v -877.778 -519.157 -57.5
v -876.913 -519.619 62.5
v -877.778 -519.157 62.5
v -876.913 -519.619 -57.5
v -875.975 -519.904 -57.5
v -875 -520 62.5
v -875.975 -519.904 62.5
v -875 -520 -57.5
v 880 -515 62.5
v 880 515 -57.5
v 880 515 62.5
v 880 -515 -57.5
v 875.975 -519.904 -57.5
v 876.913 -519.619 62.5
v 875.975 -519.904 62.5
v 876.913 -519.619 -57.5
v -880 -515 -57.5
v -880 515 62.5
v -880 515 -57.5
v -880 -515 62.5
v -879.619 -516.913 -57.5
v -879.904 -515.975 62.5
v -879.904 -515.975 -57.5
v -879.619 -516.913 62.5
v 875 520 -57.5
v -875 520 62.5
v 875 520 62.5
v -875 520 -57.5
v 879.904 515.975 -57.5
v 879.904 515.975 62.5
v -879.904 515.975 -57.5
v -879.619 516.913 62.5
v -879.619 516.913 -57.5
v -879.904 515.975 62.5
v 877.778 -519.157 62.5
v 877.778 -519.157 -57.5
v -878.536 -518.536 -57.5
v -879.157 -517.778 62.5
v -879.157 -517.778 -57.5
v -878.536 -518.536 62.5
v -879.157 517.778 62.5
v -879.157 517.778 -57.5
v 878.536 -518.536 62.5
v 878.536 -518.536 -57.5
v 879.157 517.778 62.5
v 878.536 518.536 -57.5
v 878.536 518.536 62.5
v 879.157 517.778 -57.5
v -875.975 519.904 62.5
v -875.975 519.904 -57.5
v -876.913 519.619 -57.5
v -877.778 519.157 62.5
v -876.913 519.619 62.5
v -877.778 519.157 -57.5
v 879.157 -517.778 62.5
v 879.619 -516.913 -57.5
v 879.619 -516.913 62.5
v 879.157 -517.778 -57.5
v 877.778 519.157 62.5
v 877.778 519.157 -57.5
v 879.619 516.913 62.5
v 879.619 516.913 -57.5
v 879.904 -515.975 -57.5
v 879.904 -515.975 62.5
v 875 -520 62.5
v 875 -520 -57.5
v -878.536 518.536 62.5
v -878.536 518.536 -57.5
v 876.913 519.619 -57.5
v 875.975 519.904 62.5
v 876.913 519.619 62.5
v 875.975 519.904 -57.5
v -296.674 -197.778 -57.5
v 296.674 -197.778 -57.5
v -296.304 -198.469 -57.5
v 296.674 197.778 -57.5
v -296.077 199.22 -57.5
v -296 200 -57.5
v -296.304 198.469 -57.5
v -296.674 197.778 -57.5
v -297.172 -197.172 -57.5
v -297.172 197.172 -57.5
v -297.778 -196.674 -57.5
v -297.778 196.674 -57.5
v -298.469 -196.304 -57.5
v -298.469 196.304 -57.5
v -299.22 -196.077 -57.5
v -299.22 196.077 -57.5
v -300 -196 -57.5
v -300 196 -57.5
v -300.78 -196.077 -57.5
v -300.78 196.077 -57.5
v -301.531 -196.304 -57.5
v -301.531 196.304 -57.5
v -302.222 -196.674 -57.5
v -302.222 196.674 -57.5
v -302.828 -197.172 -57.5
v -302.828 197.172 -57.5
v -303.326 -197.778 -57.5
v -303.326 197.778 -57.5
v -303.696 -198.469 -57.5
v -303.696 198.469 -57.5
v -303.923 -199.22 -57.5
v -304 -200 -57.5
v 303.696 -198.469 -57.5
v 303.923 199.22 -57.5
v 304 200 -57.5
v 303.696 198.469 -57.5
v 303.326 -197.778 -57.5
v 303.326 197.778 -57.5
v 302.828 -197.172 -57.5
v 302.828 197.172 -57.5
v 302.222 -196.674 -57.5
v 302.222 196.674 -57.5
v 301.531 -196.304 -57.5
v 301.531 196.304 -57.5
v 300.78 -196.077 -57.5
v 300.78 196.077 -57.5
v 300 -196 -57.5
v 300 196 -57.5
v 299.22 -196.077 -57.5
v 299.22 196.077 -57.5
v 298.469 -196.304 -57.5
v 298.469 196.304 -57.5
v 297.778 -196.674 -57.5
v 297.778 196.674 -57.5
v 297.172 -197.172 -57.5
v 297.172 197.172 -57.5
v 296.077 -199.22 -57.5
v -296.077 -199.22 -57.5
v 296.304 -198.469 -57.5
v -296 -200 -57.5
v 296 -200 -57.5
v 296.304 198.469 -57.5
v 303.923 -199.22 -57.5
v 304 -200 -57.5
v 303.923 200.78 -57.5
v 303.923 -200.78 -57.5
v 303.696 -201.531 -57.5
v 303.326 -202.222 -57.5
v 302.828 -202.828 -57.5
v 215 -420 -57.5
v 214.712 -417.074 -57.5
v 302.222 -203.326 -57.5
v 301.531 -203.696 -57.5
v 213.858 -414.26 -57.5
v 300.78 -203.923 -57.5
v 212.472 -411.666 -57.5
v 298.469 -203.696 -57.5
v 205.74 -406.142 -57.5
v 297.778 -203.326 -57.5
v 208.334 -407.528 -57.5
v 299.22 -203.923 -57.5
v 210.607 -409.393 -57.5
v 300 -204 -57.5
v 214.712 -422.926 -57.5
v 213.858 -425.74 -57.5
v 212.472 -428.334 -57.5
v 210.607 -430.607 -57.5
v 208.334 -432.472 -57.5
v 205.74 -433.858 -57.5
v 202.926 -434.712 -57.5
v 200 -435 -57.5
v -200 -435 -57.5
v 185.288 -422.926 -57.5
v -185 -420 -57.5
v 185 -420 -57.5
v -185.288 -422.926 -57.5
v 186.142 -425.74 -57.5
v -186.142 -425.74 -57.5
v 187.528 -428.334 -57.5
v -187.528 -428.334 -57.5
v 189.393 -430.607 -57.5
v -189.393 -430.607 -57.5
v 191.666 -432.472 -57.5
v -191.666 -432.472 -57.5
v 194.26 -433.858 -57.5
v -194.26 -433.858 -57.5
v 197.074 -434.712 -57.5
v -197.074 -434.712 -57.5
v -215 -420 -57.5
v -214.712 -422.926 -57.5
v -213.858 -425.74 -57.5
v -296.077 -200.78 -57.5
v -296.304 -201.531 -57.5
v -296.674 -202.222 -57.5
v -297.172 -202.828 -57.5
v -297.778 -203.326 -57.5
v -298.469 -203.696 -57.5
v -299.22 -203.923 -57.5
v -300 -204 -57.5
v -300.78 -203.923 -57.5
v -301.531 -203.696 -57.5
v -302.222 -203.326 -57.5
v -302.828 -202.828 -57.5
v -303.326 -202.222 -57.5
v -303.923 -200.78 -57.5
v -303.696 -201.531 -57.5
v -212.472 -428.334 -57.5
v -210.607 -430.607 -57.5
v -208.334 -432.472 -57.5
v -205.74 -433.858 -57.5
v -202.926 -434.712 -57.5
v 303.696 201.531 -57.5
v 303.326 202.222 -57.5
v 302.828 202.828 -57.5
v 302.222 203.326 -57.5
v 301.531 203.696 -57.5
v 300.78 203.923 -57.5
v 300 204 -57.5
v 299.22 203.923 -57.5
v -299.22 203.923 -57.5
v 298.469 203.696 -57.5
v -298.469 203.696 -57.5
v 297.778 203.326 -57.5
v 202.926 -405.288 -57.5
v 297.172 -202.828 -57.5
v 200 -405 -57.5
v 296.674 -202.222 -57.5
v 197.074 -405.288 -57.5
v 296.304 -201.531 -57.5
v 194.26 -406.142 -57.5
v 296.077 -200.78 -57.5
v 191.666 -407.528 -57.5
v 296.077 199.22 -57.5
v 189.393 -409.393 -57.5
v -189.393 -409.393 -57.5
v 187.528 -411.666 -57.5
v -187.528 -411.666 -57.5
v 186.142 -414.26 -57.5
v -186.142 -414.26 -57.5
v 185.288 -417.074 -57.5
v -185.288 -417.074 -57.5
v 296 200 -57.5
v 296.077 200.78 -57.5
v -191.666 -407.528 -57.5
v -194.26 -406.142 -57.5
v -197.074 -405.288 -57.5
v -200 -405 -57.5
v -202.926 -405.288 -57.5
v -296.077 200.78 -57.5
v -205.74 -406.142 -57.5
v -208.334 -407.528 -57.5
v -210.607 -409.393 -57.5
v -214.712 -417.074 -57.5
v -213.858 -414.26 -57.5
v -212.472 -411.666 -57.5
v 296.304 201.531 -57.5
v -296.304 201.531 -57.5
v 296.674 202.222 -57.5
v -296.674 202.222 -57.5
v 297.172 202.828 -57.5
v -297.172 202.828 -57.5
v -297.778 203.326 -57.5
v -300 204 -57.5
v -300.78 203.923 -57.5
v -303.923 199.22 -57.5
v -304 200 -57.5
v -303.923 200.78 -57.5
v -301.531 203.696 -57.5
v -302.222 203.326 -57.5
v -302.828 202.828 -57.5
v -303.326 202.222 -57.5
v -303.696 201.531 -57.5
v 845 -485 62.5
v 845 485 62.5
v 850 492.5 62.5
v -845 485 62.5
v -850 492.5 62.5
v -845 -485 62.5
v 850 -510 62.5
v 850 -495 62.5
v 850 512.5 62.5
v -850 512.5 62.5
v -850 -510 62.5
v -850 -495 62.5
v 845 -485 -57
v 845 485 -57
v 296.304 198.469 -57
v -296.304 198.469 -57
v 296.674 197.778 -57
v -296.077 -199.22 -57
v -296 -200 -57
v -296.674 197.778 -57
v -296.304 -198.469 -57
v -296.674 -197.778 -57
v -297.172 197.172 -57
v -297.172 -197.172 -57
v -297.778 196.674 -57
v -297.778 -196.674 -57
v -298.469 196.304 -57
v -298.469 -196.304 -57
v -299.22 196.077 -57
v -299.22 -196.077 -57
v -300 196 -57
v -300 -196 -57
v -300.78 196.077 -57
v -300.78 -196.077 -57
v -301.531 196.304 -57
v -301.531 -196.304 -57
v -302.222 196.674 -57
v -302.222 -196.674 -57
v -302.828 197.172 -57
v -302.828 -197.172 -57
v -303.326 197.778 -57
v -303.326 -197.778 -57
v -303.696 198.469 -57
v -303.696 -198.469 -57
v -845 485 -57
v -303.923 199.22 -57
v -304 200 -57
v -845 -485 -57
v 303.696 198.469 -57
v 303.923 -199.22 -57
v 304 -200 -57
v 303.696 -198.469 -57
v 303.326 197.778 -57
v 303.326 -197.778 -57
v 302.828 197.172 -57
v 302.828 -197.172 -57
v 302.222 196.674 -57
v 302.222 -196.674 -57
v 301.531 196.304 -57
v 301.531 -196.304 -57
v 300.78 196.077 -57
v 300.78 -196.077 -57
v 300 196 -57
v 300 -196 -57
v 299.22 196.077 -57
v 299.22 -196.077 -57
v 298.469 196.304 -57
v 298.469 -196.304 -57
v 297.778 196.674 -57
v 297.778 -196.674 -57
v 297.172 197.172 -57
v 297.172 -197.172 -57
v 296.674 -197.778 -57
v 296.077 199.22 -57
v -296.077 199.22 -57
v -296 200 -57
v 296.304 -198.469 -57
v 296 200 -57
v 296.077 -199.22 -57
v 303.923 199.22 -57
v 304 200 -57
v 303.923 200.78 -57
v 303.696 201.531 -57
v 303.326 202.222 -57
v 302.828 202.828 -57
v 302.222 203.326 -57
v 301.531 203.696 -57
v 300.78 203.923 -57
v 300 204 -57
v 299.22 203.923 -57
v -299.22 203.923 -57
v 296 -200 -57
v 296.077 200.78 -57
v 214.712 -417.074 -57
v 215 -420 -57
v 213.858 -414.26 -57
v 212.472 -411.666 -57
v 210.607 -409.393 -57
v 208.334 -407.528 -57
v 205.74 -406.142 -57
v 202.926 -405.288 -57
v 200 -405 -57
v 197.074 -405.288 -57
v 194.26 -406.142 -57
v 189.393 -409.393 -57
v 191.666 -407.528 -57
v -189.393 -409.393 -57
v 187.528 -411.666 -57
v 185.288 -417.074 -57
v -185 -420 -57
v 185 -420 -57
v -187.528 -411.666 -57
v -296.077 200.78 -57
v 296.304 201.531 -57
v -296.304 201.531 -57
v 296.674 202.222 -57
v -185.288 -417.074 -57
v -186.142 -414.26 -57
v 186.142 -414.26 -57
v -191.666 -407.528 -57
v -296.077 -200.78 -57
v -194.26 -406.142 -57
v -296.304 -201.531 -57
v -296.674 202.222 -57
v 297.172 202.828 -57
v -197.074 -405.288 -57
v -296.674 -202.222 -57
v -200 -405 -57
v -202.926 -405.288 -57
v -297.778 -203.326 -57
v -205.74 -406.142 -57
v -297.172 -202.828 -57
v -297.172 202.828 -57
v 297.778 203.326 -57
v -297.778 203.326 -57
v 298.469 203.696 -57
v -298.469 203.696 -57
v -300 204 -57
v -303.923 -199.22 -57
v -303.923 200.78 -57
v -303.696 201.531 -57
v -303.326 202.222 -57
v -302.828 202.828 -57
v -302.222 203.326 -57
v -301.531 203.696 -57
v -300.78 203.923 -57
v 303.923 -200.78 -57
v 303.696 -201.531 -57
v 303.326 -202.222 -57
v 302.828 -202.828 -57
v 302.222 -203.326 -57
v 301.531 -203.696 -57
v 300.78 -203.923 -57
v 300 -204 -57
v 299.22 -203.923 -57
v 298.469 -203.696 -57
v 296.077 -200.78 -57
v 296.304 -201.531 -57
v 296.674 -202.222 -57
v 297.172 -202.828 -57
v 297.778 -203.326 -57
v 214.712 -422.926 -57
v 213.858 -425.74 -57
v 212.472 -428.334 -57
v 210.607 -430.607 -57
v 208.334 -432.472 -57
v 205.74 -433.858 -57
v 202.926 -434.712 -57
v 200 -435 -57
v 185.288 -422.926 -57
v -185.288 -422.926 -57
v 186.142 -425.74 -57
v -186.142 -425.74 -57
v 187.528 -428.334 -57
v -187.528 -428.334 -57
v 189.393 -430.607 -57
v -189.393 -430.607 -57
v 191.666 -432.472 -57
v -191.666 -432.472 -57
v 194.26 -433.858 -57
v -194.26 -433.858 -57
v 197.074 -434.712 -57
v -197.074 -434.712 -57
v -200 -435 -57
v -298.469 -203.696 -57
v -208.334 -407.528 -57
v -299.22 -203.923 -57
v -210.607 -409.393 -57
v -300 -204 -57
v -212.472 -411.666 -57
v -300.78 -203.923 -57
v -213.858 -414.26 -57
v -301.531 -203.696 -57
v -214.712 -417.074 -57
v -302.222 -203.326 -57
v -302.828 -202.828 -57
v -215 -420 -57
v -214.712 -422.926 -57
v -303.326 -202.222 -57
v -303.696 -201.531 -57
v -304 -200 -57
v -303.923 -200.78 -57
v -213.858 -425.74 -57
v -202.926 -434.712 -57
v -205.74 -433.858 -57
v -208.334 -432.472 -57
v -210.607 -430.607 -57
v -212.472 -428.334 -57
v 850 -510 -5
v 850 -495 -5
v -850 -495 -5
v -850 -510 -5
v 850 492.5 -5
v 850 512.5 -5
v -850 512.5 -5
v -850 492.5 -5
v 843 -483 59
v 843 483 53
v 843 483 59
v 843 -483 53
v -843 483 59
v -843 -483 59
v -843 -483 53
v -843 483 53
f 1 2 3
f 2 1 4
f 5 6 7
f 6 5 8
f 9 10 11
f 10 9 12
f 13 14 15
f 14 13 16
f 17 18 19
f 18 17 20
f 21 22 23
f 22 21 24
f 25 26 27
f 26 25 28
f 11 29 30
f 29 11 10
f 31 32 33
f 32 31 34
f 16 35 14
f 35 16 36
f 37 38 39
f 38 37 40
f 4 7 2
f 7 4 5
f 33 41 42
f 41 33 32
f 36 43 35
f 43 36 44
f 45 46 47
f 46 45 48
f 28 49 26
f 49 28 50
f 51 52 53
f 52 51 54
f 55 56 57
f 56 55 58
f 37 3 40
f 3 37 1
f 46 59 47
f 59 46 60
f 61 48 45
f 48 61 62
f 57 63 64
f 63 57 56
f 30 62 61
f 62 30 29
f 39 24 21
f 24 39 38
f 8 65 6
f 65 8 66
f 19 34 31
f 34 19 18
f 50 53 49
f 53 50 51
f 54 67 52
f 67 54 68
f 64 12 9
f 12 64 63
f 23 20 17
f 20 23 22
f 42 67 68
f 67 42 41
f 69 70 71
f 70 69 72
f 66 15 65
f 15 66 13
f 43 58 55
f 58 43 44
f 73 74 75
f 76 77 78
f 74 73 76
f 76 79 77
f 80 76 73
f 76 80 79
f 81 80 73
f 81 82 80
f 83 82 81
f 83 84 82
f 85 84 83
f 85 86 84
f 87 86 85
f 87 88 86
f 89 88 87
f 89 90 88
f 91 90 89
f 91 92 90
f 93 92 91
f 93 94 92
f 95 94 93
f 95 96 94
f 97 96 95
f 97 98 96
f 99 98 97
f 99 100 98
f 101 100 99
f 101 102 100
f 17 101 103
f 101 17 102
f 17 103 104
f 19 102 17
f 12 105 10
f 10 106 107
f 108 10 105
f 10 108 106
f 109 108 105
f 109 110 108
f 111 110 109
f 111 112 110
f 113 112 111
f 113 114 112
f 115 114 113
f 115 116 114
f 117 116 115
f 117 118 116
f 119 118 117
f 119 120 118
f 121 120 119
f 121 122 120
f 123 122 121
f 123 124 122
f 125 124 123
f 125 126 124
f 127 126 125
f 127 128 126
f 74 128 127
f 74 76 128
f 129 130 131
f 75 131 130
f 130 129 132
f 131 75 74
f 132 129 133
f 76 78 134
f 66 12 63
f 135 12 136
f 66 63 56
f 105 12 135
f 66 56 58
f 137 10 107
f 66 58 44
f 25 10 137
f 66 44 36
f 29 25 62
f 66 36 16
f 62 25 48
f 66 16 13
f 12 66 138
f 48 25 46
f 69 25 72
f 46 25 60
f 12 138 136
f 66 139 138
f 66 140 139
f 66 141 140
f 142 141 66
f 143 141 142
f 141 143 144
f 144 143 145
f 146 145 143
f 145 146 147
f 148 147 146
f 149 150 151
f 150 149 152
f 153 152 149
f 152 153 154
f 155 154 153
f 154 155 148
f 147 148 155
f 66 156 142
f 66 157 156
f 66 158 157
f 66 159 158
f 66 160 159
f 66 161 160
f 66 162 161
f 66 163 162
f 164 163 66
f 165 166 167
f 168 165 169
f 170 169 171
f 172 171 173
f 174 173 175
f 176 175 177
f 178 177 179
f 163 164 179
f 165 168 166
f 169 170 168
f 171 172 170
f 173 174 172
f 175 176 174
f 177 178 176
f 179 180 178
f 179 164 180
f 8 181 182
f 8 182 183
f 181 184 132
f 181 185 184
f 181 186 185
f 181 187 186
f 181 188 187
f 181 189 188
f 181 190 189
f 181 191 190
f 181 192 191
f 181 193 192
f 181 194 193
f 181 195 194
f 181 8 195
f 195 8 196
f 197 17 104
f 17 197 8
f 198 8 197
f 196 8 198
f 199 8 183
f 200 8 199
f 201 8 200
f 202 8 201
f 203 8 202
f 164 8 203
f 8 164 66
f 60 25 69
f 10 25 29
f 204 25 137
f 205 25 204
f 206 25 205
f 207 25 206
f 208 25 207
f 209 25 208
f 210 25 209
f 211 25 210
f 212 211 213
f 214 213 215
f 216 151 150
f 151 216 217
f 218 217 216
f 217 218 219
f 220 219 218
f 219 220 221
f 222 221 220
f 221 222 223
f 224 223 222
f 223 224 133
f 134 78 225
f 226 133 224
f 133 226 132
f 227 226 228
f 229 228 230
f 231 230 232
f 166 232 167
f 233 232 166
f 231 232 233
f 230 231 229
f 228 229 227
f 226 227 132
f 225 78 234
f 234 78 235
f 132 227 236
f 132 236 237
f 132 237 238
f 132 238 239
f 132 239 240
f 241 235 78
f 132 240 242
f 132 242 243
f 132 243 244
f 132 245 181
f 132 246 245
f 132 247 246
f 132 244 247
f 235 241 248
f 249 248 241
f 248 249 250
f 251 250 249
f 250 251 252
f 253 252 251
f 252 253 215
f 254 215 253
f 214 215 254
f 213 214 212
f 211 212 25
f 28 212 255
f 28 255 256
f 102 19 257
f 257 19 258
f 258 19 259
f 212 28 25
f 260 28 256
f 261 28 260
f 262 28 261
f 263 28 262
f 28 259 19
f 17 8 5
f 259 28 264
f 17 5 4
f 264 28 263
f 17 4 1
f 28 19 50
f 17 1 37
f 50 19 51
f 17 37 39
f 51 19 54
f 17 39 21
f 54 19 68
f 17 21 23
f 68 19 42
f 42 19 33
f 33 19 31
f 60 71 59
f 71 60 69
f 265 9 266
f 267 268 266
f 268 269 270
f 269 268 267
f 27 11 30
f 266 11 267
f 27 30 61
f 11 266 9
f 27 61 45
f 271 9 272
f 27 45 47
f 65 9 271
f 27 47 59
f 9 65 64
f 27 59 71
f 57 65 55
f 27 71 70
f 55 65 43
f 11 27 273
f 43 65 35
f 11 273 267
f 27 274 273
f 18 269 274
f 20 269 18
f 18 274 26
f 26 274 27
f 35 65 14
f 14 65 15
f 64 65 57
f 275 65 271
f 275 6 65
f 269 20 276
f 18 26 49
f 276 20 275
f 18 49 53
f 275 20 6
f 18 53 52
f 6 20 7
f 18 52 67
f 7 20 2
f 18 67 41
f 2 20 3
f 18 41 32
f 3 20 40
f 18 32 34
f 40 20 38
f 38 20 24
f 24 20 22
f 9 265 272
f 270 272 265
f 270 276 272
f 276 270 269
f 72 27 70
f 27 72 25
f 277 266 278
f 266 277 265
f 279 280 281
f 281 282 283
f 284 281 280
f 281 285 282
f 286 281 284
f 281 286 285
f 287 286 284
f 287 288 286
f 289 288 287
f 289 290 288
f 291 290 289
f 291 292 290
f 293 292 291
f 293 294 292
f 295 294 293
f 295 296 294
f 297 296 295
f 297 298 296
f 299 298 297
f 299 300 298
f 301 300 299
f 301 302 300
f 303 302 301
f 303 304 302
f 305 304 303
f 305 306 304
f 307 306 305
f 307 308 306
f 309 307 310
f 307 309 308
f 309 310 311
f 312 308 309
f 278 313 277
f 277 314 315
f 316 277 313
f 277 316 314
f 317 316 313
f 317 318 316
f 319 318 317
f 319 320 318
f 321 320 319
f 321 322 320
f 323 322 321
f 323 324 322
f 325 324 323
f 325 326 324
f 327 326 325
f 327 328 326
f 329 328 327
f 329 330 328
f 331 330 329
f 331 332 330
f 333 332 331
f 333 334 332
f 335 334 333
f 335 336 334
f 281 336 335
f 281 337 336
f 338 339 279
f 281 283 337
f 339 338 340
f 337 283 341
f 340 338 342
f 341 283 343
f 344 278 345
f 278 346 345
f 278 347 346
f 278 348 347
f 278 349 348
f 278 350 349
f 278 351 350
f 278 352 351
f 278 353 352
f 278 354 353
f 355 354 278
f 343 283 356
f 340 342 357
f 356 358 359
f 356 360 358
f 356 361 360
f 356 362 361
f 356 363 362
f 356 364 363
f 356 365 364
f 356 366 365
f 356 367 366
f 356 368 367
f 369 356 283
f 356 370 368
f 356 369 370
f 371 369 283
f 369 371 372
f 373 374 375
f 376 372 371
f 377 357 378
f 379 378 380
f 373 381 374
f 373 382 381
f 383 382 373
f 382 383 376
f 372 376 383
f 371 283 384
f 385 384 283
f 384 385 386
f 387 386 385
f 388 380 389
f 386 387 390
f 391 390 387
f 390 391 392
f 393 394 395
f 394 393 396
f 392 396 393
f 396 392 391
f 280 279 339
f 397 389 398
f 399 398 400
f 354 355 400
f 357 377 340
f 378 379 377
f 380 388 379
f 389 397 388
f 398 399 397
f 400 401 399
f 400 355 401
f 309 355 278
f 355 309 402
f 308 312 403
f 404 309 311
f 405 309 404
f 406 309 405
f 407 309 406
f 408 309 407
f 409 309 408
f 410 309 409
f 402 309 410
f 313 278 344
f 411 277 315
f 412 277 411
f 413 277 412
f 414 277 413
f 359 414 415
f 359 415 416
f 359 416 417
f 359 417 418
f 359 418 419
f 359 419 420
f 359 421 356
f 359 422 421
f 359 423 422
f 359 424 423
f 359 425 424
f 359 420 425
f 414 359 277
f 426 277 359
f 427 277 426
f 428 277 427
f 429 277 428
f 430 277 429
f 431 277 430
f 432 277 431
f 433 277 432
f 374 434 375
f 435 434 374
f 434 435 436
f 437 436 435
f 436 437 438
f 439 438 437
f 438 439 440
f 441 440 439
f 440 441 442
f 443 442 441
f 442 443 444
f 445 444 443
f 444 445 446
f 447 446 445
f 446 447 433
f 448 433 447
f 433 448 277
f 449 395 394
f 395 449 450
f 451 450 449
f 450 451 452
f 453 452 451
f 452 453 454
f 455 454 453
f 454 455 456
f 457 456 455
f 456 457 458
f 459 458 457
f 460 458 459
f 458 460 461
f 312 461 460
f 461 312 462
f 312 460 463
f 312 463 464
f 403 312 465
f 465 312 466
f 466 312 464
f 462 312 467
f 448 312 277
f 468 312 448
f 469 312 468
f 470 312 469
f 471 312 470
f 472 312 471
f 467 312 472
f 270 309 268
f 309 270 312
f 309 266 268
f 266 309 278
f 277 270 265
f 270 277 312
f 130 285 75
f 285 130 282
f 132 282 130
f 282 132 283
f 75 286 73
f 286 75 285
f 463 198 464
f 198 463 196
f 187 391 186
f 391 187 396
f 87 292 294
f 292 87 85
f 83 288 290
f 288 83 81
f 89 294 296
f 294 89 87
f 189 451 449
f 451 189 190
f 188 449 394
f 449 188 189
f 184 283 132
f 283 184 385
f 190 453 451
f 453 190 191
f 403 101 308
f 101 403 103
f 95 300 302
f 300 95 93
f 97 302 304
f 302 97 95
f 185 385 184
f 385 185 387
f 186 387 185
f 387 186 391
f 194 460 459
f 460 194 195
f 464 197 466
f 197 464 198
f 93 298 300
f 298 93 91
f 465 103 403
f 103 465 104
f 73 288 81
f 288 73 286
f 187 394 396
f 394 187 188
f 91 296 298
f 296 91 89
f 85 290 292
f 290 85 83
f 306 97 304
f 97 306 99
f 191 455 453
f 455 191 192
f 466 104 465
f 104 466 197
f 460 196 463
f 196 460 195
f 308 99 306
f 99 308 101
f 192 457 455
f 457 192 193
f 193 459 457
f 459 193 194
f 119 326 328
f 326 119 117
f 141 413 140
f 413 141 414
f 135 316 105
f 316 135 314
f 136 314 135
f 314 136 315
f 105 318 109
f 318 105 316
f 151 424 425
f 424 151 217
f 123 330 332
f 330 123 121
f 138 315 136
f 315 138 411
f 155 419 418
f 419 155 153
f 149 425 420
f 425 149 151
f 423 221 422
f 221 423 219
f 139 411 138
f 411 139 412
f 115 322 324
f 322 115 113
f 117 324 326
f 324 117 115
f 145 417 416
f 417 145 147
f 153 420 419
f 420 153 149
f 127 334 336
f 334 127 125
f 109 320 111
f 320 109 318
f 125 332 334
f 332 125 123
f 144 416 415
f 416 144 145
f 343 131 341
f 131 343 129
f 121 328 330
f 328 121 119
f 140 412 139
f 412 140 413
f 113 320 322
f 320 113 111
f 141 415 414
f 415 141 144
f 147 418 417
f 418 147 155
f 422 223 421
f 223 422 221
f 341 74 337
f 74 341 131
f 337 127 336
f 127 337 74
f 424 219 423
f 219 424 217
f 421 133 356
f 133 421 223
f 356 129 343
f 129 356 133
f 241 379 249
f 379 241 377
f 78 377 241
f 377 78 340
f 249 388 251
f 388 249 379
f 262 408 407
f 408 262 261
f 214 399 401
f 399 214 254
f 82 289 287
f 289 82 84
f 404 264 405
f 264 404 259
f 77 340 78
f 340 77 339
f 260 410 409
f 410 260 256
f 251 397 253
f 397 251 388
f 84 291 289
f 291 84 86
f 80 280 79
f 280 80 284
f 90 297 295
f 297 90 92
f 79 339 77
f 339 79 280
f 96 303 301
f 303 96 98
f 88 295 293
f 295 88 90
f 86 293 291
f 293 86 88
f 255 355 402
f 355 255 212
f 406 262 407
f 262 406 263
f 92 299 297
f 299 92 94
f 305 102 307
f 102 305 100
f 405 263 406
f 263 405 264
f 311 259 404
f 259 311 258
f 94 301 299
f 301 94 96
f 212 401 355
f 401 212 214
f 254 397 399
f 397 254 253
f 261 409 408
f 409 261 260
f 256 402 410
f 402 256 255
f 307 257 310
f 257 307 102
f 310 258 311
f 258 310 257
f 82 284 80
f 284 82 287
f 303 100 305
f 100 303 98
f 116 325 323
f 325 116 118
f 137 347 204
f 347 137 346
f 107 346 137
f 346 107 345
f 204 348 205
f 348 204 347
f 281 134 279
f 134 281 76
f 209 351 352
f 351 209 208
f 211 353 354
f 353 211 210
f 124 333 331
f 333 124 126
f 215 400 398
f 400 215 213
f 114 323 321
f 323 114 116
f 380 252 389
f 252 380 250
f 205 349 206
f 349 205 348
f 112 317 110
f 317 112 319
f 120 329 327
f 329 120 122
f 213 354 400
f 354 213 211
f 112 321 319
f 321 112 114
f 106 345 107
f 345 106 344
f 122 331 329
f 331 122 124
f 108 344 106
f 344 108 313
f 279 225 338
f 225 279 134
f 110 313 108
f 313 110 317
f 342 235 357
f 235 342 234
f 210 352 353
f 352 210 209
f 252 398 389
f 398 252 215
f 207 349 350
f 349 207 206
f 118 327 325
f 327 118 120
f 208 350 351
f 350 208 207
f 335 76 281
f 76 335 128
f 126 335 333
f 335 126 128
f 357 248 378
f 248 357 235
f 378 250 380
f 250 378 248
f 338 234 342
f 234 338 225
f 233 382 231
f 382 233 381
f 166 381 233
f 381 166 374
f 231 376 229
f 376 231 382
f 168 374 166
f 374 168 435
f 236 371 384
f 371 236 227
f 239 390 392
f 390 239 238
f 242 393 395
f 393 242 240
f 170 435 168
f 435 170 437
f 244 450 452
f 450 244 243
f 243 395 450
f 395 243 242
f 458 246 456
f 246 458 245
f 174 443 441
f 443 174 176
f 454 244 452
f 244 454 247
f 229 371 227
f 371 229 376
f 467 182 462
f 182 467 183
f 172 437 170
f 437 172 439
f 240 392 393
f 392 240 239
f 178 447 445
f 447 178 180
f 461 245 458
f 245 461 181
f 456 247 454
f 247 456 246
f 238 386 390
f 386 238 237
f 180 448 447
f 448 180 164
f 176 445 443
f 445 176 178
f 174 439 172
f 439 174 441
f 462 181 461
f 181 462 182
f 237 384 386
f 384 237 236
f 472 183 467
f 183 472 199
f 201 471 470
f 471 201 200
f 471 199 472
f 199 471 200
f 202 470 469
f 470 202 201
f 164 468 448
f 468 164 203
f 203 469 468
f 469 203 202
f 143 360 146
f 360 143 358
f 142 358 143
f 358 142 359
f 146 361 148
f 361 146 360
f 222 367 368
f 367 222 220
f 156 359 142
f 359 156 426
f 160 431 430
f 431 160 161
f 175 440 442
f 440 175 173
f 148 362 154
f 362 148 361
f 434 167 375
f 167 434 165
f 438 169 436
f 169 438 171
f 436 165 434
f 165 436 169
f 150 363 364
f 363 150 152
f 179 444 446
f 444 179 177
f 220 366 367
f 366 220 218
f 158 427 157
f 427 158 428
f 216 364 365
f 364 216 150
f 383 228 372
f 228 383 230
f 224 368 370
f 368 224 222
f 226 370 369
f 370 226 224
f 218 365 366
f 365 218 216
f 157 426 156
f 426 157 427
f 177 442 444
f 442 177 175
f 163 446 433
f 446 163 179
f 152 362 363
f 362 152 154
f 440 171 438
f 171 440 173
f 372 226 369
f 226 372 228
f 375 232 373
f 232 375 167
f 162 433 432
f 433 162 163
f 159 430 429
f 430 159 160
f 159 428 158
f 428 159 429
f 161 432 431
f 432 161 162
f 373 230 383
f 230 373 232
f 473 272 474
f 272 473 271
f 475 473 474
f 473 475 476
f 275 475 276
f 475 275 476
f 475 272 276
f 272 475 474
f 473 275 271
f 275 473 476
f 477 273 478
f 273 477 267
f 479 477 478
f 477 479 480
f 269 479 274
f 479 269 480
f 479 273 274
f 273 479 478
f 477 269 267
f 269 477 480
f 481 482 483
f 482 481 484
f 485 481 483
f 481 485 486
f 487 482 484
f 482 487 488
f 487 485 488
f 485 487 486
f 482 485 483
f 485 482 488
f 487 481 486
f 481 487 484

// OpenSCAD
// ATE-75 Outdoor TV Enclosure - OpenSCAD Model
// Apex Enclosures v3.0 Front-Breathing Design
// All dimensions in mm

// ============================================
// PARAMETERS
// ============================================

// Overall dimensions
WIDTH = 1760;       // External width
HEIGHT = 1040;      // External height
DEPTH = 120;        // External depth

// Frame construction
BEZEL_WIDTH = 35;   // Bezel width
WALL_THICK = 3;     // Aluminum wall thickness

// Air channel
AIR_GAP = 25;       // Gap between glass and TV

// Airflow slots
INTAKE_SLOT_WIDTH = 1700;   // Bottom intake slot length
INTAKE_SLOT_HEIGHT = 15;    // Bottom intake slot height
EXHAUST_SLOT_WIDTH = 1700;  // Top exhaust slot length
EXHAUST_SLOT_HEIGHT = 20;   // Top exhaust slot height

// Fan specifications
FAN_COUNT = 4;
FAN_DIAMETER = 60;
FAN_DEPTH = 15;

// VESA mount (600x400 for 75" TV)
VESA_H = 600;
VESA_V = 400;
VESA_HOLE = 8;      // M8 holes

// Glass
GLASS_THICK = 6;

// Corner radius for aesthetics
CORNER_R = 5;

// ============================================
// MAIN ENCLOSURE
// ============================================

module outer_shell() {
    difference() {
        // Outer body with rounded corners
        minkowski() {
            cube([WIDTH - CORNER_R*2, HEIGHT - CORNER_R*2, DEPTH - CORNER_R], center=true);
            cylinder(r=CORNER_R, h=CORNER_R, $fn=32);
        }

        // Inner cavity (hollow out)
        translate([0, 0, WALL_THICK])
        cube([WIDTH - BEZEL_WIDTH*2, HEIGHT - BEZEL_WIDTH*2, DEPTH], center=true);
    }
}

// ============================================
// BOTTOM BEZEL - INTAKE SLOT
// ============================================

module intake_slot() {
    translate([0, -HEIGHT/2 + BEZEL_WIDTH/2, DEPTH/2])
    cube([INTAKE_SLOT_WIDTH, INTAKE_SLOT_HEIGHT, DEPTH + 10], center=true);
}

// ============================================
// TOP BEZEL - EXHAUST SLOT
// ============================================

module exhaust_slot() {
    translate([0, HEIGHT/2 - BEZEL_WIDTH/2, DEPTH/2])
    cube([EXHAUST_SLOT_WIDTH, EXHAUST_SLOT_HEIGHT, DEPTH + 10], center=true);
}

// ============================================
// FAN HOLES (4x 60mm in top bezel)
// ============================================

module fan_holes() {
    fan_spacing = EXHAUST_SLOT_WIDTH / (FAN_COUNT + 1);

    for (i = [1:FAN_COUNT]) {
        translate([-EXHAUST_SLOT_WIDTH/2 + fan_spacing * i,
                   HEIGHT/2 - BEZEL_WIDTH/2,
                   DEPTH - FAN_DEPTH/2])
        cylinder(d=FAN_DIAMETER, h=FAN_DEPTH + 10, center=true, $fn=64);
    }
}

// ============================================
// VESA MOUNT PATTERN
// ============================================

module vesa_holes() {
    positions = [
        [-VESA_H/2, -VESA_V/2],
        [VESA_H/2, -VESA_V/2],
        [-VESA_H/2, VESA_V/2],
        [VESA_H/2, VESA_V/2]
    ];

    for (pos = positions) {
        translate([pos[0], pos[1], -DEPTH/2])
        cylinder(d=VESA_HOLE, h=WALL_THICK + 10, $fn=32);
    }
}

// ============================================
// CABLE ENTRY HOLES (bottom of rear panel)
// ============================================

module cable_holes() {
    // Two cable entry points
    for (x = [-200, 200]) {
        translate([x, -HEIGHT/2 + 100, -DEPTH/2])
        cylinder(d=30, h=WALL_THICK + 10, $fn=32);
    }
}

// ============================================
// GLASS PANEL (separate for visualization)
// ============================================

module glass_panel() {
    color("LightBlue", 0.3)
    translate([0, 0, DEPTH/2 - GLASS_THICK/2 - 1])
    cube([WIDTH - BEZEL_WIDTH*2 - 4, HEIGHT - BEZEL_WIDTH*2 - 4, GLASS_THICK], center=true);
}

// ============================================
// ASSEMBLE COMPLETE ENCLOSURE
// ============================================

module enclosure() {
    difference() {
        outer_shell();
        intake_slot();
        exhaust_slot();
        fan_holes();
        vesa_holes();
        cable_holes();
    }
}

// ============================================
// RENDER
// ============================================

// Main enclosure body (aluminum)
color("DimGray")
enclosure();

// Glass panel (transparent blue)
glass_panel();

// Info text (won't appear in STL)
echo("ATE-75 Enclosure: 1760 x 1040 x 120mm");
echo("v3.0 Front-Breathing Design");
